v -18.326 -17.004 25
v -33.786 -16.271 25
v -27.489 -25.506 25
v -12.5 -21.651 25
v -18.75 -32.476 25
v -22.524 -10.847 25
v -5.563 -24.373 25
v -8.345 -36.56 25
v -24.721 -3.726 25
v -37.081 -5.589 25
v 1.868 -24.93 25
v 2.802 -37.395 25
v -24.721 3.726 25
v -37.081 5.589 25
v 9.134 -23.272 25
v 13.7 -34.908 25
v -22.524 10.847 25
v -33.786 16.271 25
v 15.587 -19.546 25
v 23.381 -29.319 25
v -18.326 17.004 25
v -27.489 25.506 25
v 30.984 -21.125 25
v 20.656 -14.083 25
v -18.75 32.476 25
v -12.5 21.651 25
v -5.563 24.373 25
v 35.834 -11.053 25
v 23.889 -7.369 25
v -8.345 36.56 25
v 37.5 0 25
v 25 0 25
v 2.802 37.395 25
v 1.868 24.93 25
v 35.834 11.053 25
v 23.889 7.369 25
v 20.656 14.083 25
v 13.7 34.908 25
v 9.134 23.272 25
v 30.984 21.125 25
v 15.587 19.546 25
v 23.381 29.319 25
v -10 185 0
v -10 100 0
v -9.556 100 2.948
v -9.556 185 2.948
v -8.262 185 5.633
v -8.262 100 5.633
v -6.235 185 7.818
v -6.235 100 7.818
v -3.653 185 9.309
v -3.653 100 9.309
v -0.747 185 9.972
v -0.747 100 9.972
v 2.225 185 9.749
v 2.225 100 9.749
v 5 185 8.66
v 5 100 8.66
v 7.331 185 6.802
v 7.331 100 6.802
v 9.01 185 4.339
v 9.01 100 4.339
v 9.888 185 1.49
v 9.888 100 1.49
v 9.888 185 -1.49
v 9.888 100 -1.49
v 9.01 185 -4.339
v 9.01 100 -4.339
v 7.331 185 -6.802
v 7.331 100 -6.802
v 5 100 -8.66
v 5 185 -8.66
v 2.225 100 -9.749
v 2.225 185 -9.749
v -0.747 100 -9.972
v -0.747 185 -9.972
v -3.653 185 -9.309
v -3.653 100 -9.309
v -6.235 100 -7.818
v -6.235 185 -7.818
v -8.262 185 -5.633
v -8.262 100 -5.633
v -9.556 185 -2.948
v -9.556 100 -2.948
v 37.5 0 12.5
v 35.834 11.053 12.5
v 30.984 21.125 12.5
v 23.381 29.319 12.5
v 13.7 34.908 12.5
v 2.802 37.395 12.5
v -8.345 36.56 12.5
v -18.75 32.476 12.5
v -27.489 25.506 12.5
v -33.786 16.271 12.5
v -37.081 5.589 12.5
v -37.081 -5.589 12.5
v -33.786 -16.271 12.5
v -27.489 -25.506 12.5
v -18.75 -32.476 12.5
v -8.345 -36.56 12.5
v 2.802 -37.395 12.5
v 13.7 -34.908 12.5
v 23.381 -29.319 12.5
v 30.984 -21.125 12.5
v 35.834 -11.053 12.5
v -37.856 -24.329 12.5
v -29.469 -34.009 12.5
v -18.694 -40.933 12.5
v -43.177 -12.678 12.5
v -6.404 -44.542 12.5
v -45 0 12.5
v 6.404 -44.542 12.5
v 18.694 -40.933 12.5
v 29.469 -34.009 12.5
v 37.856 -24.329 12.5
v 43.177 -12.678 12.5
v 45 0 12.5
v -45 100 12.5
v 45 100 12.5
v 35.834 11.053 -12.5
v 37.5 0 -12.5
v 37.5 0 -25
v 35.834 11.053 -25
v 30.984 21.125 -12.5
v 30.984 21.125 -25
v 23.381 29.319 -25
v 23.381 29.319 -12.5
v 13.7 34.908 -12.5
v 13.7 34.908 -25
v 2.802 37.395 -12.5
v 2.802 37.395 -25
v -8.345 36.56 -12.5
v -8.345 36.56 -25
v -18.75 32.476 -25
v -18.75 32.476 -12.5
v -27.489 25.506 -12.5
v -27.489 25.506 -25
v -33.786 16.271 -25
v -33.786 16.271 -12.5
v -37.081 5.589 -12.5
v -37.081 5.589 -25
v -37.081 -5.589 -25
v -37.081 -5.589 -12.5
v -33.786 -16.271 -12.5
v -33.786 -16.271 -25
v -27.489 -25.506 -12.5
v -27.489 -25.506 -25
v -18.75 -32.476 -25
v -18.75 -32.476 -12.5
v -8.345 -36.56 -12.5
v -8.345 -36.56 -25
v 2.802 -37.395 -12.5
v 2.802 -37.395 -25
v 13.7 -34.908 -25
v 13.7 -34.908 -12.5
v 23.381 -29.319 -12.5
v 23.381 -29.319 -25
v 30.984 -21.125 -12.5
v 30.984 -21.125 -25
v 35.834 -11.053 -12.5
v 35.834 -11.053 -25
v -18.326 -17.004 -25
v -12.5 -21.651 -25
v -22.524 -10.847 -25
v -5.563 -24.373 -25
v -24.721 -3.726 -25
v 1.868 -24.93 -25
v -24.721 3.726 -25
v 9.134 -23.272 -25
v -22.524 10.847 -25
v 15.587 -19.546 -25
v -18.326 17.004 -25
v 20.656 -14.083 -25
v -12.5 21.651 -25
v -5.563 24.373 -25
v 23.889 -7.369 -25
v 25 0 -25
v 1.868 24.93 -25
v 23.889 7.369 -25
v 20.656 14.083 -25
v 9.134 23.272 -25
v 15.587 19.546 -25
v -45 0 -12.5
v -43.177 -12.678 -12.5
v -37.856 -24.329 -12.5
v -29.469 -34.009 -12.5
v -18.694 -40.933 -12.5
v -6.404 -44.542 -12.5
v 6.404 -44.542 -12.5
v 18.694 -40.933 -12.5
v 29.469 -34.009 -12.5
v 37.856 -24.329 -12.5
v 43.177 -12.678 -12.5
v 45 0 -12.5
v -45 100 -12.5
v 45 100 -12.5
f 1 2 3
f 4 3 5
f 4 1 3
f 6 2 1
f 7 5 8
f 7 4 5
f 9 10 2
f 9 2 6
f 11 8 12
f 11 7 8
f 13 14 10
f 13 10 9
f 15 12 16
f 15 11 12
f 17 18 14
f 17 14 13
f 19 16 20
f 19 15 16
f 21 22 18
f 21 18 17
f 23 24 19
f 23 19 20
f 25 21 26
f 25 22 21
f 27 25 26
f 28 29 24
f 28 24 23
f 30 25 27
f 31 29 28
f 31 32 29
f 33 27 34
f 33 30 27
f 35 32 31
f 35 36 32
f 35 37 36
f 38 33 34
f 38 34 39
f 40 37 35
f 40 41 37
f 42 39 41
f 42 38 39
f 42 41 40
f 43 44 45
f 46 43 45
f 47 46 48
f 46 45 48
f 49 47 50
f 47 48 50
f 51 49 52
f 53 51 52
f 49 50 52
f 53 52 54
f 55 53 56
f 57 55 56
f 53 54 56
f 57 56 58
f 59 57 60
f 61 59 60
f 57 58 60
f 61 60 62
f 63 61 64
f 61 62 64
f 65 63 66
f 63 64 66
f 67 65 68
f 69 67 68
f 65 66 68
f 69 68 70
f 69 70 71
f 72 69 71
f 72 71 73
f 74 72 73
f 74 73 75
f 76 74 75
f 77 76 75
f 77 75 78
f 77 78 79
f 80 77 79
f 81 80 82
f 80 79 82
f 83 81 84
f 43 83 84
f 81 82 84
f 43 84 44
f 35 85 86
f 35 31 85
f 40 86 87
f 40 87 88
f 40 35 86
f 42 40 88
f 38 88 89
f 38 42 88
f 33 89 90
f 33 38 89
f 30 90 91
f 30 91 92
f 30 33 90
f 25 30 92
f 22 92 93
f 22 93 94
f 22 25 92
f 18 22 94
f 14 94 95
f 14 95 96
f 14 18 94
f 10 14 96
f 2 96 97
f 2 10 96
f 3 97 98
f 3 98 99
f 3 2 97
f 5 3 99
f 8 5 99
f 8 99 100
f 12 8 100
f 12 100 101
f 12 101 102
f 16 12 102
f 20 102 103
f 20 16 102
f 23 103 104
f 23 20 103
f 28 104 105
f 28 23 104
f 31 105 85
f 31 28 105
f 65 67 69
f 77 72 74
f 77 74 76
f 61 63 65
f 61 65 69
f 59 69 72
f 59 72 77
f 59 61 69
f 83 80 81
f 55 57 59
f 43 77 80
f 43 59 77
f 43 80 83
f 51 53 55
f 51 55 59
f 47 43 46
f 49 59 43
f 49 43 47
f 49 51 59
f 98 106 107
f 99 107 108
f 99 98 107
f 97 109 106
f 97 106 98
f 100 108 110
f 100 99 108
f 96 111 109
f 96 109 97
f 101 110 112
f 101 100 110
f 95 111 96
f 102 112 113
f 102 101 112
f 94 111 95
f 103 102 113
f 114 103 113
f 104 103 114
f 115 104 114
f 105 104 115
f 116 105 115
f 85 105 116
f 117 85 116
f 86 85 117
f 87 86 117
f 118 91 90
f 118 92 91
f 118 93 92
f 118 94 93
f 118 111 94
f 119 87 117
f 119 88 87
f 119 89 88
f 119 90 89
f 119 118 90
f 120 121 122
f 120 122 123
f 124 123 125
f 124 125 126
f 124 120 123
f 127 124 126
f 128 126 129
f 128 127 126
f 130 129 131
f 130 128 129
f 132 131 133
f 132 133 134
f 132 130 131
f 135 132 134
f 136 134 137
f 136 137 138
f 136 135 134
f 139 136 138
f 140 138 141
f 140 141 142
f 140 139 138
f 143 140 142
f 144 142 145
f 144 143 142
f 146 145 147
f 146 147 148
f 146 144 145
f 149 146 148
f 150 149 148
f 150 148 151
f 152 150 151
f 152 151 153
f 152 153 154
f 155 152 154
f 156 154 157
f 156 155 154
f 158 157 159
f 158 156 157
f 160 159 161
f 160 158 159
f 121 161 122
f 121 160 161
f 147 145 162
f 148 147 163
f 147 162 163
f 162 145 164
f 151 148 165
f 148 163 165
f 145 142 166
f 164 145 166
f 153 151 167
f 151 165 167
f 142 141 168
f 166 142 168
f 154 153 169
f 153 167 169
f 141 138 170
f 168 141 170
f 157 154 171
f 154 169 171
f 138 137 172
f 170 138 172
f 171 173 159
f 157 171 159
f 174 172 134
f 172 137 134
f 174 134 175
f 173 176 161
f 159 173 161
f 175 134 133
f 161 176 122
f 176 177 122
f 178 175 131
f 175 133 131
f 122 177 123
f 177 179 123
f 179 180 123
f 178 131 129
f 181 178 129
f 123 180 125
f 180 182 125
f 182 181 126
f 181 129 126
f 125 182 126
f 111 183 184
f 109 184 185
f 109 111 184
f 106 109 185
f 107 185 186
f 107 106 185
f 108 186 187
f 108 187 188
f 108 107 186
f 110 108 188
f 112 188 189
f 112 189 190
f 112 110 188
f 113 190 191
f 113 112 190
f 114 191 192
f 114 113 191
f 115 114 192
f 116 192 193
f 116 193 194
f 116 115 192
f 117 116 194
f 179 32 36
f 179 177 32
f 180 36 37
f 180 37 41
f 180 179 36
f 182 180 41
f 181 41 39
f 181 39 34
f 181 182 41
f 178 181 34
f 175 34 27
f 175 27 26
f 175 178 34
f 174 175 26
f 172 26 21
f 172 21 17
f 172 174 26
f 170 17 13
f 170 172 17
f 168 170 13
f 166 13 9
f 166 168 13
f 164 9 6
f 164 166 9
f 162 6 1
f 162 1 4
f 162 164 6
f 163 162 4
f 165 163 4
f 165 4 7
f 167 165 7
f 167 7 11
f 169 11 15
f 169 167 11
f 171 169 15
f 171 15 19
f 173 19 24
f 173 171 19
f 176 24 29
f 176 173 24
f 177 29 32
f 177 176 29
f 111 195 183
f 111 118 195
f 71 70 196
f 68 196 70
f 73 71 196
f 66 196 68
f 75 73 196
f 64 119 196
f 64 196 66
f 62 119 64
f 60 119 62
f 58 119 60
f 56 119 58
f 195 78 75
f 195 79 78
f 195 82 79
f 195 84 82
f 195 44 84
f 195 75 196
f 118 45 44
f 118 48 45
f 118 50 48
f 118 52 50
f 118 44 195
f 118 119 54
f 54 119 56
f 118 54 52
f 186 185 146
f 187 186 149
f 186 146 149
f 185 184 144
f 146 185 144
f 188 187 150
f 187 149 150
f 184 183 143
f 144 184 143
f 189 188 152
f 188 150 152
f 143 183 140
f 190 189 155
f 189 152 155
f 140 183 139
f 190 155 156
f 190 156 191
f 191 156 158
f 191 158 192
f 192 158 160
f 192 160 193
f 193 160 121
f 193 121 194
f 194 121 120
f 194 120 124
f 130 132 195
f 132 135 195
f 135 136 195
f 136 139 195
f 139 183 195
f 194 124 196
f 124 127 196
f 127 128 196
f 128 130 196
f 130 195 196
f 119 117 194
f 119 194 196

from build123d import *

# Parameters (mm, degrees)
F0_R     = 37.5
F0_R_2   = 25
F1_DEPTH = 25
F2_DEPTH = 12.5
F3_R     = 10
F4_DEPTH = 85


with BuildPart() as f1:
    # F0 (on Top) → F1 (new body, symmetric)
    with BuildSketch(Plane.XY):
        Circle(F0_R)
        Circle(F0_R_2, mode=Mode.SUBTRACT)
    extrude(amount=F1_DEPTH, both=True)

    # F0 (on Top) → F2 (join, symmetric)
    with BuildSketch(Plane.XY):
        with BuildLine():
            Line((-45, 100), (-45, 0))
            ThreePointArc((-45, 0), (0, -45), (45, 0))
            Line((45, 0), (45, 100))
            Line((45, 100), (-45, 100))
        make_face()
        Circle(F0_R, mode=Mode.SUBTRACT)
    extrude(amount=F2_DEPTH, both=True)

    # F3 (on face) → F4 (join)
    with BuildSketch(Plane(origin=(0, 100, 0), x_dir=(-1, 0, 0), z_dir=(0, 1, 0))):
        Circle(F3_R)
    extrude(amount=F4_DEPTH)


solid = f1.part
